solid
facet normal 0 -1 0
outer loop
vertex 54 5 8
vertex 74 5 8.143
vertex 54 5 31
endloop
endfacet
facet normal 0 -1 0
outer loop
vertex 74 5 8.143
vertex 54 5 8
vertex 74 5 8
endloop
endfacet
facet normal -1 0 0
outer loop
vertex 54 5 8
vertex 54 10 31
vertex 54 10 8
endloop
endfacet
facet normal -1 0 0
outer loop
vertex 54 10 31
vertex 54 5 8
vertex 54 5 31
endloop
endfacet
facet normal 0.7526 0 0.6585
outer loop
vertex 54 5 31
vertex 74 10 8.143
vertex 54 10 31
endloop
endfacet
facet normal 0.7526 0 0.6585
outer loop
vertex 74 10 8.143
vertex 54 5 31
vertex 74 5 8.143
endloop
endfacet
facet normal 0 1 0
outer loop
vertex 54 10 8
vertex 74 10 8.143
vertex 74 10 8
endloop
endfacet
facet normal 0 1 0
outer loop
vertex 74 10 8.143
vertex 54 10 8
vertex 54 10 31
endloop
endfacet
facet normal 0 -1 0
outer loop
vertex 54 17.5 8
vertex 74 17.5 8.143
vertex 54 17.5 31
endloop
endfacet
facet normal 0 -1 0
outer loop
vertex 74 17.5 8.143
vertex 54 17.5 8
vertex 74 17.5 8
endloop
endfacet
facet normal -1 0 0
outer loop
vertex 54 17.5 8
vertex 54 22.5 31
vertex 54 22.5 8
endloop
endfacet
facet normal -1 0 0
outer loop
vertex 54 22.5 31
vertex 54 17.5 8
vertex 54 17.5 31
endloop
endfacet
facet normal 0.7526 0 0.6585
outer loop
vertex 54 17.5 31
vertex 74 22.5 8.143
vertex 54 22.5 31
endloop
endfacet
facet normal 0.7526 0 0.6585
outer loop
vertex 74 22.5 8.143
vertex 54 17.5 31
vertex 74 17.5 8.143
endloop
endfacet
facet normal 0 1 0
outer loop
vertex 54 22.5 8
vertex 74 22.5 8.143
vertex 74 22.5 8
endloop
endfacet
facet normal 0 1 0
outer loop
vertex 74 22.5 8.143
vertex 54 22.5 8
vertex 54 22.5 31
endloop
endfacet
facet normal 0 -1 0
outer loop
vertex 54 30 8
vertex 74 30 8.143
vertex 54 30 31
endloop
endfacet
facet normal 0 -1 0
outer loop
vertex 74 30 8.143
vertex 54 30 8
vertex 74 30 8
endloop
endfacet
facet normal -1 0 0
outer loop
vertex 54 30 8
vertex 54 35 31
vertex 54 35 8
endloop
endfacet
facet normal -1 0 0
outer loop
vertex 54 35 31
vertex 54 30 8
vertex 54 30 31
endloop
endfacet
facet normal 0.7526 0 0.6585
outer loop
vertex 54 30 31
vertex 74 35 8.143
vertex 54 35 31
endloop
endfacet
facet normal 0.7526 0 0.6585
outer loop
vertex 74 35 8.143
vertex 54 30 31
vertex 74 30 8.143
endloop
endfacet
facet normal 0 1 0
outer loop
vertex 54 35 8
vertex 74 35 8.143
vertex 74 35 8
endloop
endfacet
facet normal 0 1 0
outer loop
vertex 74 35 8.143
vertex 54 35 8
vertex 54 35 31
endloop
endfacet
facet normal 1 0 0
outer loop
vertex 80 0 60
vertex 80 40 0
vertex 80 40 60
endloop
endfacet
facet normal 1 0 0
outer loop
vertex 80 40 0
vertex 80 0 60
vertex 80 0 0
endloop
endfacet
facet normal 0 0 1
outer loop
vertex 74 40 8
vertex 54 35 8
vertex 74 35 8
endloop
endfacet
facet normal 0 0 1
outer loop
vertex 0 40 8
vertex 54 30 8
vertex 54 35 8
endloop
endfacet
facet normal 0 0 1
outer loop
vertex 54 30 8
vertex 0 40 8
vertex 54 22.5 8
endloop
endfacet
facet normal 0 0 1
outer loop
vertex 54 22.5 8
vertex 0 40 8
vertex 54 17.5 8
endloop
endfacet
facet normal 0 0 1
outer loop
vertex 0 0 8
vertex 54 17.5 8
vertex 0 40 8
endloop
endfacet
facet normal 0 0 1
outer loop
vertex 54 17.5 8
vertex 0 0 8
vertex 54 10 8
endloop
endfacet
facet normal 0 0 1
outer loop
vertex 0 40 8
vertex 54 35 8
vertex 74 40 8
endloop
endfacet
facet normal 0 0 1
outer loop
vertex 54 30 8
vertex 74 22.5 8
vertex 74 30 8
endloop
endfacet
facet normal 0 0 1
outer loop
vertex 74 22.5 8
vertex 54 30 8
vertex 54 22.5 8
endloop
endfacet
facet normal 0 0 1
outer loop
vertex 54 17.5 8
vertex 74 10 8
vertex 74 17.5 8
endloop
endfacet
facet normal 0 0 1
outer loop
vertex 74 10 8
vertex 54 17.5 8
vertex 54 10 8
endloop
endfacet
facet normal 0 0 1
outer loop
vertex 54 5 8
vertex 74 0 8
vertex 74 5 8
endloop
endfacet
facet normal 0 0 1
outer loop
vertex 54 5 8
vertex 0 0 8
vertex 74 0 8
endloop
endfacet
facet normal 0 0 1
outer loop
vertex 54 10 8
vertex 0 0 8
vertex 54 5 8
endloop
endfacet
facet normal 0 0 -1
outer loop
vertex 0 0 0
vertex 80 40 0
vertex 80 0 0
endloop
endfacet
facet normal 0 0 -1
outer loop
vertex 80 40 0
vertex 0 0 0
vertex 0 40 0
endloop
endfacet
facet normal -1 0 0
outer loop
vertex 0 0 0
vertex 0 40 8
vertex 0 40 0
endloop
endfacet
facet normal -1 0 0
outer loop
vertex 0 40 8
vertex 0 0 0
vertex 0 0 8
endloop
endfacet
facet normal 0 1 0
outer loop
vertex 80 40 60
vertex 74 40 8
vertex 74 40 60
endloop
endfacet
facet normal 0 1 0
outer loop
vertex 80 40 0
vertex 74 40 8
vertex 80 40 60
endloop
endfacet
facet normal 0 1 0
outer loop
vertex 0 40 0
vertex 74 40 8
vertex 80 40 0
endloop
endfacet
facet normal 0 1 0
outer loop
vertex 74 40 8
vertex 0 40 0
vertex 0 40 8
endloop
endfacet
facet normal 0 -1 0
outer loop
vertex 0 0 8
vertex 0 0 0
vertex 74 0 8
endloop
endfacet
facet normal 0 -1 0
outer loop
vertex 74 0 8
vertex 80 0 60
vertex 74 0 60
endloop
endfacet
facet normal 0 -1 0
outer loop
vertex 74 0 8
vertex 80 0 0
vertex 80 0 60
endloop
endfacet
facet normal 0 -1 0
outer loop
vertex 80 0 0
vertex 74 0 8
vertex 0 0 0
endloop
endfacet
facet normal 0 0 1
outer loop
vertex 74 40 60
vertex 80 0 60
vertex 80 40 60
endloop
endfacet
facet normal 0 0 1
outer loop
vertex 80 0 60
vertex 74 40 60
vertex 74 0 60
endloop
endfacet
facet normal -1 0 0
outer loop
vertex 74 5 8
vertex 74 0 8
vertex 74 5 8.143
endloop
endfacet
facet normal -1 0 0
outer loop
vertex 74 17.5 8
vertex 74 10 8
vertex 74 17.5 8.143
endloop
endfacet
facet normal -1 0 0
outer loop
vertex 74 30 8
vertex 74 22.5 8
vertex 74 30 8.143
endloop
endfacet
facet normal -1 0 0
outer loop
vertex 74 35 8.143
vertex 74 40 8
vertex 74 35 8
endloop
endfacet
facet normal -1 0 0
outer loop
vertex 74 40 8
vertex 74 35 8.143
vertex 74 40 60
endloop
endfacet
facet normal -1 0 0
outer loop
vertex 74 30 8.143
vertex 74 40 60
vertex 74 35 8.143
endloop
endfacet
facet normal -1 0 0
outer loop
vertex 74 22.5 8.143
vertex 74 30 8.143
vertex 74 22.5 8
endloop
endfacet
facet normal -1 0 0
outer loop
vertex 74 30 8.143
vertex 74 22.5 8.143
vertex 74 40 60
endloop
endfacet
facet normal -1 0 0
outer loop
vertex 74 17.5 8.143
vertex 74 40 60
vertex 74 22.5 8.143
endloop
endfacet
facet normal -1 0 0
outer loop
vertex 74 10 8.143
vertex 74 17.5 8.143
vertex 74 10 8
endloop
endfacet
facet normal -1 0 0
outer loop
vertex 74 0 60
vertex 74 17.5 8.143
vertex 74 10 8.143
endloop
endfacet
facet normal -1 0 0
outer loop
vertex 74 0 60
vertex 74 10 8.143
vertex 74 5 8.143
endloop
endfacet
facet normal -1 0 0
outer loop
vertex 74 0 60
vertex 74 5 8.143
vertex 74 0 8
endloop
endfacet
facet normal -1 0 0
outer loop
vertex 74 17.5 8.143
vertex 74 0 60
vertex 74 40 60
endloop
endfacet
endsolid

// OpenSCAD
$fn = 32;

// ----------------------------------------------------------------------
// Rib bracket: 3-gusset L bracket
// ----------------------------------------------------------------------

// --- parameters (mm) ---
base_l = 80;              // foot length, X
base_w = 40;              // foot width, Y
base_t = 8;               // foot thickness
plate_t = 6;              // upright plate thickness
plate_h = 60;             // overall height
gus_l = 20;               // gusset leg along the foot
gus_h = 24;               // gusset height
gus_t = 5;                // gusset thickness
gus_edge = 5;             // gusset margin from the foot edge
n_gus = 3;                // gusset count
fit_tol = 0.1;            // tolerance for press fits, mm
free_tol = 0.3;           // tolerance for clearance fits, mm

gus_pitch = (base_w - 2 * gus_edge - gus_t) / (n_gus - 1);  // gusset pitch

union() {
  cube([base_l, base_w, base_t]);
  translate([base_l - plate_t, 0, base_t - 1])
    cube([plate_t, base_w, plate_h - base_t + 1]);
  for (i = [0 : n_gus - 1])
    translate([base_l - plate_t - gus_l, gus_edge + i * gus_pitch, base_t - 1])
      rotate([-90, 0, 0])
        linear_extrude(height = gus_t)
          polygon(points = [[0, 0], [gus_l + 1, 0], [0, -gus_h]]);
}
